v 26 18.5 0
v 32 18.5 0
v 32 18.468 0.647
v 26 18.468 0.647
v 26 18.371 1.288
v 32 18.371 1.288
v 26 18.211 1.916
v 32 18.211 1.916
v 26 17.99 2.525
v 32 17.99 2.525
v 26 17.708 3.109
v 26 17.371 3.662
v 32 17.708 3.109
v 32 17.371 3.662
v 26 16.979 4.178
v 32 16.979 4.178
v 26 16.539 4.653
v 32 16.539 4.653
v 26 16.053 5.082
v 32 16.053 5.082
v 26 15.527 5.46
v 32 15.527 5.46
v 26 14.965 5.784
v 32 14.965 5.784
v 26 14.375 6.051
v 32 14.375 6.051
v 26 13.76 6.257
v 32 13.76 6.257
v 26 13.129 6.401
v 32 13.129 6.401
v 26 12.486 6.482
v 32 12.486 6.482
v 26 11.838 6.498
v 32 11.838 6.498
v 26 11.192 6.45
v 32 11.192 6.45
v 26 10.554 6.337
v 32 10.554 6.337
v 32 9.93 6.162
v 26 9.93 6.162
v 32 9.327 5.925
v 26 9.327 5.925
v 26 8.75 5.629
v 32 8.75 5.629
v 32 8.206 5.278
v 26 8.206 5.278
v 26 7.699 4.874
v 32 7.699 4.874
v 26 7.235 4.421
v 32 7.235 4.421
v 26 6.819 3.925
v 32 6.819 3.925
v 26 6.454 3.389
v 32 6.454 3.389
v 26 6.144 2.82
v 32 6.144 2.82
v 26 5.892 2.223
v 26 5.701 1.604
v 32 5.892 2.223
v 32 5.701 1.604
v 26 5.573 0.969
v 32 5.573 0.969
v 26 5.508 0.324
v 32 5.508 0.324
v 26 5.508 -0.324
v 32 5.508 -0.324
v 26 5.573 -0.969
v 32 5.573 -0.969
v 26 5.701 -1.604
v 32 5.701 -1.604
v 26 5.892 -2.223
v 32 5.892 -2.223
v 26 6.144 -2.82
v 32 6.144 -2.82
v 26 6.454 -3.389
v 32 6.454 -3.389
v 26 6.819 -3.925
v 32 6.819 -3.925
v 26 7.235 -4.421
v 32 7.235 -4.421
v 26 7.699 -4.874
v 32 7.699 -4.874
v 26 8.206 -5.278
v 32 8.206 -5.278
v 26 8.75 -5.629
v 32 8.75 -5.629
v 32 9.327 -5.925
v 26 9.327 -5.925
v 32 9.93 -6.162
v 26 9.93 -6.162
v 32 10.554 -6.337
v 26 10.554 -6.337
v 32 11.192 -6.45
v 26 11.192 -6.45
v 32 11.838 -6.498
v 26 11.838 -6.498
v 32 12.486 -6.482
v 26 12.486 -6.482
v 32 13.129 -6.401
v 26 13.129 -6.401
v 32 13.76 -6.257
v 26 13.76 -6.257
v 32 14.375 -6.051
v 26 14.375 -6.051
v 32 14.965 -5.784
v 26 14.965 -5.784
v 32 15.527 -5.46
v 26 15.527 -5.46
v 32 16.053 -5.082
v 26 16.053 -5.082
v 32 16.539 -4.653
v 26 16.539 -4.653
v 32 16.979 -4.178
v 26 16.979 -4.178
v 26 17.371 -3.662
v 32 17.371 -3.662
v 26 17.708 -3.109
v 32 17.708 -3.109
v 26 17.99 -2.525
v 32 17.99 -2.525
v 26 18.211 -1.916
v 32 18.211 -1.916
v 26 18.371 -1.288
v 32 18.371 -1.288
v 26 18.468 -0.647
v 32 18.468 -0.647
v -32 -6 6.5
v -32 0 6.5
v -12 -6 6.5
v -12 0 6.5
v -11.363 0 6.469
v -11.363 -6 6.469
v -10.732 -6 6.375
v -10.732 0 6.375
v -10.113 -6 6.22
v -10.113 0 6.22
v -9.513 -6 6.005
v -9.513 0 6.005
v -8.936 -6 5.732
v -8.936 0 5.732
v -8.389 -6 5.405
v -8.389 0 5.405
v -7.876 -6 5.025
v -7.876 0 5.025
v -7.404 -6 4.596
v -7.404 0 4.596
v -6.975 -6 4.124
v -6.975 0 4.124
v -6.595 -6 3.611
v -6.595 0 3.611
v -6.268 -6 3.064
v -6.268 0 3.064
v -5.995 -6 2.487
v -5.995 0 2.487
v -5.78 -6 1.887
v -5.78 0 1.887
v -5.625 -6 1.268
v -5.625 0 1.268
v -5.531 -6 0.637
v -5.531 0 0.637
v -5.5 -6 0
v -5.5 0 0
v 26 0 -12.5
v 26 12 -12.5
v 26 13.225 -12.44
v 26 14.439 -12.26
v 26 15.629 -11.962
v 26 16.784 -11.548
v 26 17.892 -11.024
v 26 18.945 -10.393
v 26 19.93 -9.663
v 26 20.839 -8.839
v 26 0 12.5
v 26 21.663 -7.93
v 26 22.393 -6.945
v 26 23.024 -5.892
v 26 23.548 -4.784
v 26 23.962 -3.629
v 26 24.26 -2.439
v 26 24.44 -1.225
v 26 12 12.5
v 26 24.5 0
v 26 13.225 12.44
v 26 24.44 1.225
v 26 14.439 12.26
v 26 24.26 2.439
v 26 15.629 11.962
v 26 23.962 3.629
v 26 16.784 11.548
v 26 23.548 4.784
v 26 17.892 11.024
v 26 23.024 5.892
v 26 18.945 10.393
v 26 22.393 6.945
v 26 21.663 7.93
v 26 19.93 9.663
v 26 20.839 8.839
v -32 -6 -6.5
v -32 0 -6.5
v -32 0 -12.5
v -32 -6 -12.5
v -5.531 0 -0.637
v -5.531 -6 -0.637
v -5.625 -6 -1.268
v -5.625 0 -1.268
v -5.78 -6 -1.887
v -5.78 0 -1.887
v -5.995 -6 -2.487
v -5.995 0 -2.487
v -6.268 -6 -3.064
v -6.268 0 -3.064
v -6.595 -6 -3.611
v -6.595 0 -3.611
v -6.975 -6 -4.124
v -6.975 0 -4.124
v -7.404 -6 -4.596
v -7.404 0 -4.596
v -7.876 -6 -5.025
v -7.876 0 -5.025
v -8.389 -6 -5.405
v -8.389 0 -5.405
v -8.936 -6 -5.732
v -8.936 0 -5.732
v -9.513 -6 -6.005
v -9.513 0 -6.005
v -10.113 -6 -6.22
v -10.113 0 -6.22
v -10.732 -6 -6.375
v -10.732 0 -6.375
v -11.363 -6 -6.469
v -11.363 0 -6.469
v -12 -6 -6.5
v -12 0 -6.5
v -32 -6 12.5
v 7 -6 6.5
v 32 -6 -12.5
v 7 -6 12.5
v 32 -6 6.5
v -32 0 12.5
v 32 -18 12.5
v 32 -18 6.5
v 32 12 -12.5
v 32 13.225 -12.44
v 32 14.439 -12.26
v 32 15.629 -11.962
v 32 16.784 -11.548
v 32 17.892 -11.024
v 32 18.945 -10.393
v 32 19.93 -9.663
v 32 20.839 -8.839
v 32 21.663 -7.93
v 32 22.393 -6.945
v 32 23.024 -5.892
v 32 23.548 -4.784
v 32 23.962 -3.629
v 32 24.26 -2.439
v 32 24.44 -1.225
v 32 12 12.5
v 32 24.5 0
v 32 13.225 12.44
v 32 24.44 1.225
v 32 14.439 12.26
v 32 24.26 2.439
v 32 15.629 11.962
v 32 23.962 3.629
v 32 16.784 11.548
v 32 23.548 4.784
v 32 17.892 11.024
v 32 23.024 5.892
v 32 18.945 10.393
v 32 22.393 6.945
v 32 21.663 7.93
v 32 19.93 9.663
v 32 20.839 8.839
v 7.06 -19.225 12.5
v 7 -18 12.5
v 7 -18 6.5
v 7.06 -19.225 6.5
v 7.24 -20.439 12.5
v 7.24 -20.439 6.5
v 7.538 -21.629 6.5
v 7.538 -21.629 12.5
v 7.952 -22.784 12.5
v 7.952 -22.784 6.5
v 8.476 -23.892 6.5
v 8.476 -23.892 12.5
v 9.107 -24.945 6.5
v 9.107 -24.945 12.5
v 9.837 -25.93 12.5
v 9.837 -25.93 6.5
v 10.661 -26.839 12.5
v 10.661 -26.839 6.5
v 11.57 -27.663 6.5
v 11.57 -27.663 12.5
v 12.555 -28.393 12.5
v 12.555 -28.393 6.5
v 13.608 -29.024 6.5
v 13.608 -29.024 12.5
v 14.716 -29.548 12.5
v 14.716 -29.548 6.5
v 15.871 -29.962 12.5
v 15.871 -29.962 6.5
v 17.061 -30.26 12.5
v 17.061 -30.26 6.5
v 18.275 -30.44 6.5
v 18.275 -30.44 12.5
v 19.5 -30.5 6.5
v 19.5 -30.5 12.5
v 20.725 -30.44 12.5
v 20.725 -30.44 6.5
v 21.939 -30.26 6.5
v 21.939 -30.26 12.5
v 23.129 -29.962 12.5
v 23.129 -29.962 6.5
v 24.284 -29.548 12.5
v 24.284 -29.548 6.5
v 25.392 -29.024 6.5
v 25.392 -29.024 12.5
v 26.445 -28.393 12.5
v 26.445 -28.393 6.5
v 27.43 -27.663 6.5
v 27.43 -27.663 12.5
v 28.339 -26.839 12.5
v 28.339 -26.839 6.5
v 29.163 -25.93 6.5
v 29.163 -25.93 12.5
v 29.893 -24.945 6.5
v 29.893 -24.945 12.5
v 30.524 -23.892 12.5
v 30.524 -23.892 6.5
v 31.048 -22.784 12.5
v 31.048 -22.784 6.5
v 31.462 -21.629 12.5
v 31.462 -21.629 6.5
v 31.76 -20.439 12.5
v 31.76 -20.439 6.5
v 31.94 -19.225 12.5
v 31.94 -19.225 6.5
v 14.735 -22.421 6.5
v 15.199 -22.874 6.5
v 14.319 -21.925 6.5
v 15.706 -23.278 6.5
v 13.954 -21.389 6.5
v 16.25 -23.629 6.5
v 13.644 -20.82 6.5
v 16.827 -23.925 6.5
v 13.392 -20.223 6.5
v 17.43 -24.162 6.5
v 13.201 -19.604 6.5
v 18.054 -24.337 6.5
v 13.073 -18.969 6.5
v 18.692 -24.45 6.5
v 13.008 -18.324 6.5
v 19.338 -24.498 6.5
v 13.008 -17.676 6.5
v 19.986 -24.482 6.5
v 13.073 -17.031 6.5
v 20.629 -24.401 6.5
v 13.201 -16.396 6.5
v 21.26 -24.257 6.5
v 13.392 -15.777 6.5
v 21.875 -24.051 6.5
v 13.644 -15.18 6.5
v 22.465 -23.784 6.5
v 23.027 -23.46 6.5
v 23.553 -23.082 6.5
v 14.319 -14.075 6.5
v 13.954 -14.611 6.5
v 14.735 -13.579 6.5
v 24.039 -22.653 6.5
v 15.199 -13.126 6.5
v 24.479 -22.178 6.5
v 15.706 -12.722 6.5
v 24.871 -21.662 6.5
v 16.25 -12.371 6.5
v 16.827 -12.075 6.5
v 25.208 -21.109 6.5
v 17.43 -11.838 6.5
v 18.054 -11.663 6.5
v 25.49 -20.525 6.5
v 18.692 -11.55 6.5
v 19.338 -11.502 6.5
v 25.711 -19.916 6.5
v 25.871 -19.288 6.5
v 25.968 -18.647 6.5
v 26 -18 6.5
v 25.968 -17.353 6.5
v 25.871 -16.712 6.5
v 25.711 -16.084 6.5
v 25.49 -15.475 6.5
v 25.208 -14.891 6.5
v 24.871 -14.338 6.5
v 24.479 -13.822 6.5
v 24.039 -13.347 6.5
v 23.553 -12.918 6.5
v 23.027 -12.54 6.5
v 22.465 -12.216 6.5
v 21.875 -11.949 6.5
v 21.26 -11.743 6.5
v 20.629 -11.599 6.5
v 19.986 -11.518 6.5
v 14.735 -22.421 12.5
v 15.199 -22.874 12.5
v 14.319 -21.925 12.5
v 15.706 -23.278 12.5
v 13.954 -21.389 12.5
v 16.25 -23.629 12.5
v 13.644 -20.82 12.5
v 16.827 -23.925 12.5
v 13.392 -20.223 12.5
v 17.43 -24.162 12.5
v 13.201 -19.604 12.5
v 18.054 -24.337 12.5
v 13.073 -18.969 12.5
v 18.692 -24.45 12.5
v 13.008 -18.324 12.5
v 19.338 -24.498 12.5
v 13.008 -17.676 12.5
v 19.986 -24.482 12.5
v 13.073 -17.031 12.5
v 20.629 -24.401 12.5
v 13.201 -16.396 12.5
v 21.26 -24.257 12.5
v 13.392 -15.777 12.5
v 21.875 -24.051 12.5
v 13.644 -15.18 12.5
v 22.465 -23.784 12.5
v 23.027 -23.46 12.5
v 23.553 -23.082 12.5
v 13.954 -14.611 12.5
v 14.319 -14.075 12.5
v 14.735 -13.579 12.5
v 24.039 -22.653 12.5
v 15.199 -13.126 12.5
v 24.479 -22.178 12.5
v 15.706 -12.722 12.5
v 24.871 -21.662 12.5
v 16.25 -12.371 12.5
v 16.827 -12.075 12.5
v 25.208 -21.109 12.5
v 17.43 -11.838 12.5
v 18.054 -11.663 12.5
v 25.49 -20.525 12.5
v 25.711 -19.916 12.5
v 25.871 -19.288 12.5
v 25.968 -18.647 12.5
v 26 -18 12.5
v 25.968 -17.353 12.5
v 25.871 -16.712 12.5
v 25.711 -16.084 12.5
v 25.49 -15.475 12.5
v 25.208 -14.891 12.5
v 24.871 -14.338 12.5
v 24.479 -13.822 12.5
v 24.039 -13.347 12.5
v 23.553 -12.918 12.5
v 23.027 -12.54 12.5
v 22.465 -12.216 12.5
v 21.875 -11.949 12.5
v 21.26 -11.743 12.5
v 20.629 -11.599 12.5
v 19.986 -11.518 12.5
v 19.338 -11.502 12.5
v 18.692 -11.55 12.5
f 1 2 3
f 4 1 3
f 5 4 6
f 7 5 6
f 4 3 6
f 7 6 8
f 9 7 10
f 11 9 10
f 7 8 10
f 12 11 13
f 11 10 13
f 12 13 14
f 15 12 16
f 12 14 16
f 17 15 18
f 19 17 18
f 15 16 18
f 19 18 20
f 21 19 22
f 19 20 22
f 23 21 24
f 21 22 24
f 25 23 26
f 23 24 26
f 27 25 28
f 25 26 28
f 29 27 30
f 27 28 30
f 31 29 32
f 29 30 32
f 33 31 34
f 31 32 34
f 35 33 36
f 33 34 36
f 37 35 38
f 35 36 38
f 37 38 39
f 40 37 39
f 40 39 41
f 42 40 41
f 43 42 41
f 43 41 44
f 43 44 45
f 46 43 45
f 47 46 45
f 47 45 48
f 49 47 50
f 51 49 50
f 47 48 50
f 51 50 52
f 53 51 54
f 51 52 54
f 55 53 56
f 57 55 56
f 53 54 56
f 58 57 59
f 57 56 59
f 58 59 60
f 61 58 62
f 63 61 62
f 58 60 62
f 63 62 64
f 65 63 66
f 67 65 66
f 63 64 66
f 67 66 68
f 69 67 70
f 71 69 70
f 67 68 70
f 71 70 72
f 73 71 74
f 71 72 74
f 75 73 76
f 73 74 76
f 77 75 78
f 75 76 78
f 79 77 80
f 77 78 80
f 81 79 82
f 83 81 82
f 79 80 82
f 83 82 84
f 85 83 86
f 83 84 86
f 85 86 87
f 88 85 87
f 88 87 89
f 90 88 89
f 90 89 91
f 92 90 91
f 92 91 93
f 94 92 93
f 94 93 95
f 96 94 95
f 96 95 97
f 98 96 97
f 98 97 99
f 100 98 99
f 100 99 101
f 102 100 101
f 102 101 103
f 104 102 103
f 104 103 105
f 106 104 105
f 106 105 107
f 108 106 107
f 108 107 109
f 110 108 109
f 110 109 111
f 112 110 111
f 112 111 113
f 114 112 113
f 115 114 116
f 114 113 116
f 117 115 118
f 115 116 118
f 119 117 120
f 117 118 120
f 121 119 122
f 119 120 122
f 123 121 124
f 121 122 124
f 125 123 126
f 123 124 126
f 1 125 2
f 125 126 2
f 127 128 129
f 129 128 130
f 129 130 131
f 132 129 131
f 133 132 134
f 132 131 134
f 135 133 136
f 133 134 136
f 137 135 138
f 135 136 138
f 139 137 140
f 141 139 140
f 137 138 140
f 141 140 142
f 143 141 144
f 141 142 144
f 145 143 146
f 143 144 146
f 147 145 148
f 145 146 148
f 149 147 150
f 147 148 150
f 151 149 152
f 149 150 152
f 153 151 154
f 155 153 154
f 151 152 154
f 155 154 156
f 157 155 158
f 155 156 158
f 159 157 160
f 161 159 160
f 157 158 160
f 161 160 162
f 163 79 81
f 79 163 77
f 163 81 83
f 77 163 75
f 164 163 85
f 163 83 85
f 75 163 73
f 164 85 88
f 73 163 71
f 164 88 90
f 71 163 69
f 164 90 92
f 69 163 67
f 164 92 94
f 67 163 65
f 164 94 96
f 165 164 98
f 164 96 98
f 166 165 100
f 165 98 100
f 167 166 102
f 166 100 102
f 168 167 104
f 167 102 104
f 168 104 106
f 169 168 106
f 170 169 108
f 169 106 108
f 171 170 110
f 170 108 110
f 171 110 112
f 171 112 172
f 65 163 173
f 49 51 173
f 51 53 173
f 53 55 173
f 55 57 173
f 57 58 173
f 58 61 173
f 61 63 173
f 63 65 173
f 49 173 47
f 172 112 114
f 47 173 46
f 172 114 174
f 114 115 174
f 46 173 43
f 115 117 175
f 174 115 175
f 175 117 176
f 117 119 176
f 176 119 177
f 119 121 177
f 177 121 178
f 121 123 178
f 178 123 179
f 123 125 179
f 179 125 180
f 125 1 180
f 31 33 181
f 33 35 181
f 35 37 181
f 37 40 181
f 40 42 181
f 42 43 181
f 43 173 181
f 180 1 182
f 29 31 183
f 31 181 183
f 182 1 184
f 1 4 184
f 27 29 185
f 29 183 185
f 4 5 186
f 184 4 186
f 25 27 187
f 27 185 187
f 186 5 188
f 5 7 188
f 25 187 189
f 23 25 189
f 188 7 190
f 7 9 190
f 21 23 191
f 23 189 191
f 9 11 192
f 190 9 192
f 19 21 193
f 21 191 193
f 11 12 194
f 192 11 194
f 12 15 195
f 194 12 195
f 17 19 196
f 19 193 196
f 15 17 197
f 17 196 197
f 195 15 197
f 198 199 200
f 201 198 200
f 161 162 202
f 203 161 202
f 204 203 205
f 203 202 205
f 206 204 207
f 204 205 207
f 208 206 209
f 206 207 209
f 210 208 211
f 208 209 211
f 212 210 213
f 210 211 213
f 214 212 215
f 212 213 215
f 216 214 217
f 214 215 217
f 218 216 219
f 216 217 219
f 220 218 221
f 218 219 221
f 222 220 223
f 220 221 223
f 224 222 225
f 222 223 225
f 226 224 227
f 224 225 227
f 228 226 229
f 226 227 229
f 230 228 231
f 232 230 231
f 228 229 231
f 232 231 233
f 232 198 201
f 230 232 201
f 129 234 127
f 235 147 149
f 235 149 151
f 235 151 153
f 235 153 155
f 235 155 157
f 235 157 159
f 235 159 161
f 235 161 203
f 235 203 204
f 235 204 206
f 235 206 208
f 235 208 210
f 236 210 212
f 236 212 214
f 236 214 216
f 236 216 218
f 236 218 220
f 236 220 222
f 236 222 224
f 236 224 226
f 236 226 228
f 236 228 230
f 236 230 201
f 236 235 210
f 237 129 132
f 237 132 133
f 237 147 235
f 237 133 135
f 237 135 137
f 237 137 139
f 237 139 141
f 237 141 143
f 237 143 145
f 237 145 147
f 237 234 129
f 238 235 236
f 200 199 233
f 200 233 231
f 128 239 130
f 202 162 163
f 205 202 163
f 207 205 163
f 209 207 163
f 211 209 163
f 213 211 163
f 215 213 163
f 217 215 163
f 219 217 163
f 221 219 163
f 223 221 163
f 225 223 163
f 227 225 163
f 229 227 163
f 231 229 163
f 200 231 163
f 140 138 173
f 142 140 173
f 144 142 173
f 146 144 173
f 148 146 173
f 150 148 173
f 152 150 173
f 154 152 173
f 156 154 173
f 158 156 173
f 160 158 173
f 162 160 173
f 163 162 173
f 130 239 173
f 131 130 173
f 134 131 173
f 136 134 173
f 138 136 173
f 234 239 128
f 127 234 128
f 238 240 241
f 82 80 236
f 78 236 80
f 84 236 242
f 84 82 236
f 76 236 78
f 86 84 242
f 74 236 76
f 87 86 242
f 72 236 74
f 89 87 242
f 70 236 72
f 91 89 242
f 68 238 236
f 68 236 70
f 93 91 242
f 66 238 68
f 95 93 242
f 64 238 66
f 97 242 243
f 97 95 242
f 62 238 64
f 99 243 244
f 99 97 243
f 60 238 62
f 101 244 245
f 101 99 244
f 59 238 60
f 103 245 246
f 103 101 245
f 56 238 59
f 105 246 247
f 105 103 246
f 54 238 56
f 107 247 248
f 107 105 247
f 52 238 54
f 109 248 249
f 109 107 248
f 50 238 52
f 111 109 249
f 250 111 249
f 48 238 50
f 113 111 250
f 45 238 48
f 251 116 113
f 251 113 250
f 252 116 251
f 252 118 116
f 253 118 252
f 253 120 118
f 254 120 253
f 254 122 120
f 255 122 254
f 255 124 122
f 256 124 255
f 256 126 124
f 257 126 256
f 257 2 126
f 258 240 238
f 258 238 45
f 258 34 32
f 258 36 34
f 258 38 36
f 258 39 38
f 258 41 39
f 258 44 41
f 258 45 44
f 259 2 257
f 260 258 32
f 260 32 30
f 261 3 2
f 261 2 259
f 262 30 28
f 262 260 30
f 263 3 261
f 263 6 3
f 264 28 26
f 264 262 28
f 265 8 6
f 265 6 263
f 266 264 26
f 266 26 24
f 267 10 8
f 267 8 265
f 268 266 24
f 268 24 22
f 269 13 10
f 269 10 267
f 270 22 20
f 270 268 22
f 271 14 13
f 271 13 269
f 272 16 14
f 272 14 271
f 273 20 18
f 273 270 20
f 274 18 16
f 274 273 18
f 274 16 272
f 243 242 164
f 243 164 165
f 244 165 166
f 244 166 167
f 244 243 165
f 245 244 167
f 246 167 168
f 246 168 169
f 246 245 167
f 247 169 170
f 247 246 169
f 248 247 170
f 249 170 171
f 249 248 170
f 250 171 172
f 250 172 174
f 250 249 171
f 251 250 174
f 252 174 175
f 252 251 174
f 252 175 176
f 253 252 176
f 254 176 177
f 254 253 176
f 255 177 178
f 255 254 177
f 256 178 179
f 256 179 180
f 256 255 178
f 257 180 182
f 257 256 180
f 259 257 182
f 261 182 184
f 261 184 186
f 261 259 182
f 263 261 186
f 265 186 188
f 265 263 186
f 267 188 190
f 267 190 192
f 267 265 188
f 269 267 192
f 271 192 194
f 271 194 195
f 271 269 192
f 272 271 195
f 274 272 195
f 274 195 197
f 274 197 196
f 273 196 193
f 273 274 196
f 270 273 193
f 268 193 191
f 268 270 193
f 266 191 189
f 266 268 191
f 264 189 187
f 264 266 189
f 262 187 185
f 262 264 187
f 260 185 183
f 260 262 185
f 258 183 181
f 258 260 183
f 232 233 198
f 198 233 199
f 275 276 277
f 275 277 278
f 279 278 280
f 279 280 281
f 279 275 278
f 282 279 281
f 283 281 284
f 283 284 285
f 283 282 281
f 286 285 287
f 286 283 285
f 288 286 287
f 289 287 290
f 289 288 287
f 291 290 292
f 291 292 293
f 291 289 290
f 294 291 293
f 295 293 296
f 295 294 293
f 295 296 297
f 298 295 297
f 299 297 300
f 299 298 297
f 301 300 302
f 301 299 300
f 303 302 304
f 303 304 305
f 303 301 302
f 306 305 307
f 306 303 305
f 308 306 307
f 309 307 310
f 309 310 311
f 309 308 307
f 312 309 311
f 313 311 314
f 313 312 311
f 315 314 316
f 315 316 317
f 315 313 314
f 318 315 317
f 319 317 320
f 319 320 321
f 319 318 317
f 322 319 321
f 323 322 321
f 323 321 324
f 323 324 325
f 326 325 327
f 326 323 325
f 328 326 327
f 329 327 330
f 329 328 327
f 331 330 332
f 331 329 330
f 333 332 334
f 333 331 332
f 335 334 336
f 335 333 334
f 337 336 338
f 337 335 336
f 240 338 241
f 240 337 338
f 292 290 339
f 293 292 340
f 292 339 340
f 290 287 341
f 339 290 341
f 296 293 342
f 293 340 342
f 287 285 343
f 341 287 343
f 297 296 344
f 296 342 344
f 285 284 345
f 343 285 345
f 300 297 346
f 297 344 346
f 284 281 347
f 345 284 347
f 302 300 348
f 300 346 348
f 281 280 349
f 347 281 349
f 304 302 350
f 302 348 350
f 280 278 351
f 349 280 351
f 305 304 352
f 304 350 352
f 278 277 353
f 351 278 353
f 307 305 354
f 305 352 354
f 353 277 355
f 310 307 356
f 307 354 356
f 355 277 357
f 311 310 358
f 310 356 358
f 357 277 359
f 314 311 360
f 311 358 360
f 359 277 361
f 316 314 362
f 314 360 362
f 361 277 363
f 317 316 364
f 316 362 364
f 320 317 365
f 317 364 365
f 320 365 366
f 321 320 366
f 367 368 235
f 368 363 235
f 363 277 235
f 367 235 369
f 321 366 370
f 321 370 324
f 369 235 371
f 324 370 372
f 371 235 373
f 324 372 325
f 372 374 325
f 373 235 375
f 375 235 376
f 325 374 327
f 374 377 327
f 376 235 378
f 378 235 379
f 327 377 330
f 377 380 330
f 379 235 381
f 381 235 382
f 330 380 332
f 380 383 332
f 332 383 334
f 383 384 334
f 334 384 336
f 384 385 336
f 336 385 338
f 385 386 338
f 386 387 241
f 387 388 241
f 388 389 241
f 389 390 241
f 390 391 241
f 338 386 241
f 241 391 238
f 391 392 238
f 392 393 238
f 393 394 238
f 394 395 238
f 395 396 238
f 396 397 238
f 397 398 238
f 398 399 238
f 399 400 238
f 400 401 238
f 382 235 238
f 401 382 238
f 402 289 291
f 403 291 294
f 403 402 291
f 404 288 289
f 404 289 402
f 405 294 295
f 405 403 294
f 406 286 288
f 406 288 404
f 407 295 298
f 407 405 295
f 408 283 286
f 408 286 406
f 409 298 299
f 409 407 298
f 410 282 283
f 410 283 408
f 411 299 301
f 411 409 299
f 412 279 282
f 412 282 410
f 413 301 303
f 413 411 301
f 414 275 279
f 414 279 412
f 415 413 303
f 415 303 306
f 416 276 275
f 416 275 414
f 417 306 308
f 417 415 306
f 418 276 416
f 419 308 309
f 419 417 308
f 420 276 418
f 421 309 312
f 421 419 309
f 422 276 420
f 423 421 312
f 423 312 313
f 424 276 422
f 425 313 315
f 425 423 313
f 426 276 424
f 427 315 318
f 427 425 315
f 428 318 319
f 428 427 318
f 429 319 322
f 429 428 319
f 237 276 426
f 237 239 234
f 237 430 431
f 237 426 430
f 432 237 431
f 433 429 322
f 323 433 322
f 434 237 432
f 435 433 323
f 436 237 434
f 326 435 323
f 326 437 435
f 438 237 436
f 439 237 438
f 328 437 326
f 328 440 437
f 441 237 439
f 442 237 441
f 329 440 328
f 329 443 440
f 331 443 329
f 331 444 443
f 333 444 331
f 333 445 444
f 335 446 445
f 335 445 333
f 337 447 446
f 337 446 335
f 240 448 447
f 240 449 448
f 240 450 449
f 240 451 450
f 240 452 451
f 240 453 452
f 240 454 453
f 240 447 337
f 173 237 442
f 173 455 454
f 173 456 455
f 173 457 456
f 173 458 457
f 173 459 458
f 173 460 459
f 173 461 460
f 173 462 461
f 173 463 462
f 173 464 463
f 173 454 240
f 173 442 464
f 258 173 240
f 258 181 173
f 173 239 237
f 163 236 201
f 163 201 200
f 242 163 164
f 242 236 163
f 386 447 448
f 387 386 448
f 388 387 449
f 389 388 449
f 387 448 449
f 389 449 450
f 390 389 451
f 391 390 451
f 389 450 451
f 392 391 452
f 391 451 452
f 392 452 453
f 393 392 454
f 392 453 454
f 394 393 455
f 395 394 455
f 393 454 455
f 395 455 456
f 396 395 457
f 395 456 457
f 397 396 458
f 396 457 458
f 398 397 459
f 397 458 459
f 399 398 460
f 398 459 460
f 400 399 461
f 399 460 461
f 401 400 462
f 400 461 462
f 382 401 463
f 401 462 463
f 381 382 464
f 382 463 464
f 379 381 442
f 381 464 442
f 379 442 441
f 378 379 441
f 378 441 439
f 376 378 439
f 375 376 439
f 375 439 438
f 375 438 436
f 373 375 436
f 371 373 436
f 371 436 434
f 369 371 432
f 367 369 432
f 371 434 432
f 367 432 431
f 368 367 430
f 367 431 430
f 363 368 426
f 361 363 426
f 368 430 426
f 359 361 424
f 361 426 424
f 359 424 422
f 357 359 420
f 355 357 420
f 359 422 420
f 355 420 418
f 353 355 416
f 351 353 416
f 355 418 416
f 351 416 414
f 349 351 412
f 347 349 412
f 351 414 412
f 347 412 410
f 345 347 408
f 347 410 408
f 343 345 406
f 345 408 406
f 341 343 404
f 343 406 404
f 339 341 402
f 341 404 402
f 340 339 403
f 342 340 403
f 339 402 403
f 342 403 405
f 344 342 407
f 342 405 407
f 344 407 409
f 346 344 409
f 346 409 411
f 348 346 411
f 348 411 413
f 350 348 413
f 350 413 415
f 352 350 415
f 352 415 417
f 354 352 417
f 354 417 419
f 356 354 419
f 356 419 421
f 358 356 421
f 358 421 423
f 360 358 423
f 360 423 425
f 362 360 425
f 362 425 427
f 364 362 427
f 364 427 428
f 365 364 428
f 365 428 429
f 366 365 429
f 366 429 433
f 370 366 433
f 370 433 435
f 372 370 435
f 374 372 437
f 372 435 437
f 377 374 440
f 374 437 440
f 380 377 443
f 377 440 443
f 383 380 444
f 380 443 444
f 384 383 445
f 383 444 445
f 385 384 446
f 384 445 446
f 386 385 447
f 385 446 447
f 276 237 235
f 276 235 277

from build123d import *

# Parameters (mm, degrees)
F1_DEPTH = 6
F2_R     = 6.5
F3_DEPTH = 6
F4_R     = 6.5
F5_DEPTH = 6


with BuildPart() as f1:
    # F0 (on Front) → F1 (new body)
    with BuildSketch(Plane.XZ):
        with BuildLine():
            Line((32, -12.5), (32, 12.5))
            Line((32, 12.5), (-32, 12.5))
            Line((-32, 12.5), (-32, 6.5))
            Line((-32, 6.5), (-12, 6.5))
            ThreePointArc((-12, 6.5), (-7.403806, 4.596194), (-5.5, 0))
            ThreePointArc((-5.5, 0), (-7.403806, -4.596194), (-12, -6.5))
            Line((-12, -6.5), (-32, -6.5))
            Line((-32, -6.5), (-32, -12.5))
            Line((-32, -12.5), (-12.5, -12.5))
            Line((-12.5, -12.5), (12.5, -12.5))
            Line((12.5, -12.5), (32, -12.5))
        make_face()
    extrude(amount=F1_DEPTH)

    # F2 (on face) → F3 (join)
    with BuildSketch(Plane.YZ.offset(32)):
        with BuildLine():
            Line((0, 12.5), (0, -12.5))
            Line((0, -12.5), (12, -12.5))
            ThreePointArc((12, -12.5), (24.5, 0), (12, 12.5))
            Line((12, 12.5), (0, 12.5))
        make_face()
        with Locations((12, 0)):
            Circle(F2_R, mode=Mode.SUBTRACT)
    extrude(amount=-F3_DEPTH)

    # F4 (on face) → F5 (join)
    with BuildSketch(Plane.XY.offset(12.5)):
        with BuildLine():
            Line((32, -18), (32, -6))
            Line((32, -6), (7, -6))
            Line((7, -6), (7, -18))
            ThreePointArc((7, -18), (19.5, -30.5), (32, -18))
        make_face()
        with Locations((19.5, -18)):
            Circle(F4_R, mode=Mode.SUBTRACT)
    extrude(amount=-F5_DEPTH)


solid = f1.part
